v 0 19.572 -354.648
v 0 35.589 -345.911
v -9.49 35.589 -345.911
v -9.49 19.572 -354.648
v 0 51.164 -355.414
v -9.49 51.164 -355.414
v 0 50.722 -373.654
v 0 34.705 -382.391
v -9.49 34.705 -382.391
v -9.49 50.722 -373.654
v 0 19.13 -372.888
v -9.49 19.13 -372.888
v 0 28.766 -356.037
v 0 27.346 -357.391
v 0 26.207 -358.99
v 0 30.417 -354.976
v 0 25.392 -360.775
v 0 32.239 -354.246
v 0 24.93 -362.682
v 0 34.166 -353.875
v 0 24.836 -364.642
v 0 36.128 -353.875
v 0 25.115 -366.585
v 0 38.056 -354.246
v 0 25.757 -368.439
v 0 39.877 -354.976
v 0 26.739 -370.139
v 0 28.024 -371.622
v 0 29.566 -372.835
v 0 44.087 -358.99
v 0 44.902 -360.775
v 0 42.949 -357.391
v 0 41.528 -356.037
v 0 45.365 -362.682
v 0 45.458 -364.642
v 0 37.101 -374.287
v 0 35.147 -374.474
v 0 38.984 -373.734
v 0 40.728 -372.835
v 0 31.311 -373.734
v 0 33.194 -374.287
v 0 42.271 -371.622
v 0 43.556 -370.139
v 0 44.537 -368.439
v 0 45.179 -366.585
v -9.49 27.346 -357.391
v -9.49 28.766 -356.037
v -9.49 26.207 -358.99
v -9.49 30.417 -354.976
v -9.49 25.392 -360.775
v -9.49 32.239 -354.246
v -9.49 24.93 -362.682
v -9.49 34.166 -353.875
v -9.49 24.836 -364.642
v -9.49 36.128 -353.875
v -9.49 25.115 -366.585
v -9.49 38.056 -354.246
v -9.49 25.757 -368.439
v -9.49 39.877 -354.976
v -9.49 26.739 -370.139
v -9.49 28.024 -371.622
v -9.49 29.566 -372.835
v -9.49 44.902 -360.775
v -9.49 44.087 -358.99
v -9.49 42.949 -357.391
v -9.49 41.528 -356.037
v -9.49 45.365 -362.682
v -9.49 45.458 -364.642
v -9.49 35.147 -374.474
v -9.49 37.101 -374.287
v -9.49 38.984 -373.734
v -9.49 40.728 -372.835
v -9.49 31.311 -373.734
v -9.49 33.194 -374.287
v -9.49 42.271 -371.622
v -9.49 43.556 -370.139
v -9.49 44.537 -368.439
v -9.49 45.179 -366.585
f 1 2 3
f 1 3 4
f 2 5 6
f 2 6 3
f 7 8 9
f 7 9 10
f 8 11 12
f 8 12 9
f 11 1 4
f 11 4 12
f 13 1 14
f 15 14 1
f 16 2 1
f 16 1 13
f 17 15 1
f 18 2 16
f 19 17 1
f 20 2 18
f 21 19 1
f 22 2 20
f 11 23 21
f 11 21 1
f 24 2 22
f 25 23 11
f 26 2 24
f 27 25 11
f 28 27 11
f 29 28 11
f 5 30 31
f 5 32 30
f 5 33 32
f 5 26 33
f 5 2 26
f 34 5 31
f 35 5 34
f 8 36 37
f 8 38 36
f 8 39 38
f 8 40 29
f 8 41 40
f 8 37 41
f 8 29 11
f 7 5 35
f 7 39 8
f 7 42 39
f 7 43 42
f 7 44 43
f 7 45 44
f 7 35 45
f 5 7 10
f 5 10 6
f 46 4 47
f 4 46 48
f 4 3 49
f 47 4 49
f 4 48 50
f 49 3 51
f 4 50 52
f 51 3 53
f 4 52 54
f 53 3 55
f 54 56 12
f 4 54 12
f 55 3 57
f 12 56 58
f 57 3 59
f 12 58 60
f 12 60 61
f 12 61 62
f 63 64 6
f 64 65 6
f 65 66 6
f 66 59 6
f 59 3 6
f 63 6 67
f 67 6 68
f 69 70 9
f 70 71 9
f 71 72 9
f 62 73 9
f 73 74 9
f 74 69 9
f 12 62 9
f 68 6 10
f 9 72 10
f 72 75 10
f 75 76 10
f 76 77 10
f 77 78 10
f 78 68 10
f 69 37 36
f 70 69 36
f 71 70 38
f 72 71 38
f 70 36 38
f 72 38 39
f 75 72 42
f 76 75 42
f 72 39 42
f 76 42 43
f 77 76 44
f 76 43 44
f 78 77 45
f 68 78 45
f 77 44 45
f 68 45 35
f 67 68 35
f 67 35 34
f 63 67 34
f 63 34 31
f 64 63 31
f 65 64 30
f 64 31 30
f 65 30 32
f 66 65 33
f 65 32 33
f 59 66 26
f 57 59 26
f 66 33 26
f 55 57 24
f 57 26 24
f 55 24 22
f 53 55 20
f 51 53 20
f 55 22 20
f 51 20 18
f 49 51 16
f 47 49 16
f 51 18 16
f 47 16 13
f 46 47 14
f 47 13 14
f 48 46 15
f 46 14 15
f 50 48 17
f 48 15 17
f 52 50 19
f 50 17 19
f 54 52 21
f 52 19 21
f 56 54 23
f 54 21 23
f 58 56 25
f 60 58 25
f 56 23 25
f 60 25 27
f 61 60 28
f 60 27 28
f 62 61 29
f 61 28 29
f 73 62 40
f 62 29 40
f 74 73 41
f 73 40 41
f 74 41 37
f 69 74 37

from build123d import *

# Parameters (mm, degrees)
SKETCH1_R           = 10.322814
BOSS_EXTRUDE1_DEPTH = 9.490202


with BuildPart() as part:
    # Sketch1 → Boss-Extrude1 (new body)
    with BuildSketch(Plane(origin=(0, 0, 0), x_dir=(0, 0, -1), z_dir=(1, 0, 0))):
        Polygon((345.91117, 35.58921), (354.648291413, 19.572151802), (372.888031413, 19.130191802), (382.39065, 34.70529), (373.653528587, 50.722348198), (355.413788587, 51.164308198), align=None)
        with Locations((364.15091, 35.14725)):
            Circle(SKETCH1_R, mode=Mode.SUBTRACT)
    extrude(amount=-BOSS_EXTRUDE1_DEPTH)


solid = part.part
